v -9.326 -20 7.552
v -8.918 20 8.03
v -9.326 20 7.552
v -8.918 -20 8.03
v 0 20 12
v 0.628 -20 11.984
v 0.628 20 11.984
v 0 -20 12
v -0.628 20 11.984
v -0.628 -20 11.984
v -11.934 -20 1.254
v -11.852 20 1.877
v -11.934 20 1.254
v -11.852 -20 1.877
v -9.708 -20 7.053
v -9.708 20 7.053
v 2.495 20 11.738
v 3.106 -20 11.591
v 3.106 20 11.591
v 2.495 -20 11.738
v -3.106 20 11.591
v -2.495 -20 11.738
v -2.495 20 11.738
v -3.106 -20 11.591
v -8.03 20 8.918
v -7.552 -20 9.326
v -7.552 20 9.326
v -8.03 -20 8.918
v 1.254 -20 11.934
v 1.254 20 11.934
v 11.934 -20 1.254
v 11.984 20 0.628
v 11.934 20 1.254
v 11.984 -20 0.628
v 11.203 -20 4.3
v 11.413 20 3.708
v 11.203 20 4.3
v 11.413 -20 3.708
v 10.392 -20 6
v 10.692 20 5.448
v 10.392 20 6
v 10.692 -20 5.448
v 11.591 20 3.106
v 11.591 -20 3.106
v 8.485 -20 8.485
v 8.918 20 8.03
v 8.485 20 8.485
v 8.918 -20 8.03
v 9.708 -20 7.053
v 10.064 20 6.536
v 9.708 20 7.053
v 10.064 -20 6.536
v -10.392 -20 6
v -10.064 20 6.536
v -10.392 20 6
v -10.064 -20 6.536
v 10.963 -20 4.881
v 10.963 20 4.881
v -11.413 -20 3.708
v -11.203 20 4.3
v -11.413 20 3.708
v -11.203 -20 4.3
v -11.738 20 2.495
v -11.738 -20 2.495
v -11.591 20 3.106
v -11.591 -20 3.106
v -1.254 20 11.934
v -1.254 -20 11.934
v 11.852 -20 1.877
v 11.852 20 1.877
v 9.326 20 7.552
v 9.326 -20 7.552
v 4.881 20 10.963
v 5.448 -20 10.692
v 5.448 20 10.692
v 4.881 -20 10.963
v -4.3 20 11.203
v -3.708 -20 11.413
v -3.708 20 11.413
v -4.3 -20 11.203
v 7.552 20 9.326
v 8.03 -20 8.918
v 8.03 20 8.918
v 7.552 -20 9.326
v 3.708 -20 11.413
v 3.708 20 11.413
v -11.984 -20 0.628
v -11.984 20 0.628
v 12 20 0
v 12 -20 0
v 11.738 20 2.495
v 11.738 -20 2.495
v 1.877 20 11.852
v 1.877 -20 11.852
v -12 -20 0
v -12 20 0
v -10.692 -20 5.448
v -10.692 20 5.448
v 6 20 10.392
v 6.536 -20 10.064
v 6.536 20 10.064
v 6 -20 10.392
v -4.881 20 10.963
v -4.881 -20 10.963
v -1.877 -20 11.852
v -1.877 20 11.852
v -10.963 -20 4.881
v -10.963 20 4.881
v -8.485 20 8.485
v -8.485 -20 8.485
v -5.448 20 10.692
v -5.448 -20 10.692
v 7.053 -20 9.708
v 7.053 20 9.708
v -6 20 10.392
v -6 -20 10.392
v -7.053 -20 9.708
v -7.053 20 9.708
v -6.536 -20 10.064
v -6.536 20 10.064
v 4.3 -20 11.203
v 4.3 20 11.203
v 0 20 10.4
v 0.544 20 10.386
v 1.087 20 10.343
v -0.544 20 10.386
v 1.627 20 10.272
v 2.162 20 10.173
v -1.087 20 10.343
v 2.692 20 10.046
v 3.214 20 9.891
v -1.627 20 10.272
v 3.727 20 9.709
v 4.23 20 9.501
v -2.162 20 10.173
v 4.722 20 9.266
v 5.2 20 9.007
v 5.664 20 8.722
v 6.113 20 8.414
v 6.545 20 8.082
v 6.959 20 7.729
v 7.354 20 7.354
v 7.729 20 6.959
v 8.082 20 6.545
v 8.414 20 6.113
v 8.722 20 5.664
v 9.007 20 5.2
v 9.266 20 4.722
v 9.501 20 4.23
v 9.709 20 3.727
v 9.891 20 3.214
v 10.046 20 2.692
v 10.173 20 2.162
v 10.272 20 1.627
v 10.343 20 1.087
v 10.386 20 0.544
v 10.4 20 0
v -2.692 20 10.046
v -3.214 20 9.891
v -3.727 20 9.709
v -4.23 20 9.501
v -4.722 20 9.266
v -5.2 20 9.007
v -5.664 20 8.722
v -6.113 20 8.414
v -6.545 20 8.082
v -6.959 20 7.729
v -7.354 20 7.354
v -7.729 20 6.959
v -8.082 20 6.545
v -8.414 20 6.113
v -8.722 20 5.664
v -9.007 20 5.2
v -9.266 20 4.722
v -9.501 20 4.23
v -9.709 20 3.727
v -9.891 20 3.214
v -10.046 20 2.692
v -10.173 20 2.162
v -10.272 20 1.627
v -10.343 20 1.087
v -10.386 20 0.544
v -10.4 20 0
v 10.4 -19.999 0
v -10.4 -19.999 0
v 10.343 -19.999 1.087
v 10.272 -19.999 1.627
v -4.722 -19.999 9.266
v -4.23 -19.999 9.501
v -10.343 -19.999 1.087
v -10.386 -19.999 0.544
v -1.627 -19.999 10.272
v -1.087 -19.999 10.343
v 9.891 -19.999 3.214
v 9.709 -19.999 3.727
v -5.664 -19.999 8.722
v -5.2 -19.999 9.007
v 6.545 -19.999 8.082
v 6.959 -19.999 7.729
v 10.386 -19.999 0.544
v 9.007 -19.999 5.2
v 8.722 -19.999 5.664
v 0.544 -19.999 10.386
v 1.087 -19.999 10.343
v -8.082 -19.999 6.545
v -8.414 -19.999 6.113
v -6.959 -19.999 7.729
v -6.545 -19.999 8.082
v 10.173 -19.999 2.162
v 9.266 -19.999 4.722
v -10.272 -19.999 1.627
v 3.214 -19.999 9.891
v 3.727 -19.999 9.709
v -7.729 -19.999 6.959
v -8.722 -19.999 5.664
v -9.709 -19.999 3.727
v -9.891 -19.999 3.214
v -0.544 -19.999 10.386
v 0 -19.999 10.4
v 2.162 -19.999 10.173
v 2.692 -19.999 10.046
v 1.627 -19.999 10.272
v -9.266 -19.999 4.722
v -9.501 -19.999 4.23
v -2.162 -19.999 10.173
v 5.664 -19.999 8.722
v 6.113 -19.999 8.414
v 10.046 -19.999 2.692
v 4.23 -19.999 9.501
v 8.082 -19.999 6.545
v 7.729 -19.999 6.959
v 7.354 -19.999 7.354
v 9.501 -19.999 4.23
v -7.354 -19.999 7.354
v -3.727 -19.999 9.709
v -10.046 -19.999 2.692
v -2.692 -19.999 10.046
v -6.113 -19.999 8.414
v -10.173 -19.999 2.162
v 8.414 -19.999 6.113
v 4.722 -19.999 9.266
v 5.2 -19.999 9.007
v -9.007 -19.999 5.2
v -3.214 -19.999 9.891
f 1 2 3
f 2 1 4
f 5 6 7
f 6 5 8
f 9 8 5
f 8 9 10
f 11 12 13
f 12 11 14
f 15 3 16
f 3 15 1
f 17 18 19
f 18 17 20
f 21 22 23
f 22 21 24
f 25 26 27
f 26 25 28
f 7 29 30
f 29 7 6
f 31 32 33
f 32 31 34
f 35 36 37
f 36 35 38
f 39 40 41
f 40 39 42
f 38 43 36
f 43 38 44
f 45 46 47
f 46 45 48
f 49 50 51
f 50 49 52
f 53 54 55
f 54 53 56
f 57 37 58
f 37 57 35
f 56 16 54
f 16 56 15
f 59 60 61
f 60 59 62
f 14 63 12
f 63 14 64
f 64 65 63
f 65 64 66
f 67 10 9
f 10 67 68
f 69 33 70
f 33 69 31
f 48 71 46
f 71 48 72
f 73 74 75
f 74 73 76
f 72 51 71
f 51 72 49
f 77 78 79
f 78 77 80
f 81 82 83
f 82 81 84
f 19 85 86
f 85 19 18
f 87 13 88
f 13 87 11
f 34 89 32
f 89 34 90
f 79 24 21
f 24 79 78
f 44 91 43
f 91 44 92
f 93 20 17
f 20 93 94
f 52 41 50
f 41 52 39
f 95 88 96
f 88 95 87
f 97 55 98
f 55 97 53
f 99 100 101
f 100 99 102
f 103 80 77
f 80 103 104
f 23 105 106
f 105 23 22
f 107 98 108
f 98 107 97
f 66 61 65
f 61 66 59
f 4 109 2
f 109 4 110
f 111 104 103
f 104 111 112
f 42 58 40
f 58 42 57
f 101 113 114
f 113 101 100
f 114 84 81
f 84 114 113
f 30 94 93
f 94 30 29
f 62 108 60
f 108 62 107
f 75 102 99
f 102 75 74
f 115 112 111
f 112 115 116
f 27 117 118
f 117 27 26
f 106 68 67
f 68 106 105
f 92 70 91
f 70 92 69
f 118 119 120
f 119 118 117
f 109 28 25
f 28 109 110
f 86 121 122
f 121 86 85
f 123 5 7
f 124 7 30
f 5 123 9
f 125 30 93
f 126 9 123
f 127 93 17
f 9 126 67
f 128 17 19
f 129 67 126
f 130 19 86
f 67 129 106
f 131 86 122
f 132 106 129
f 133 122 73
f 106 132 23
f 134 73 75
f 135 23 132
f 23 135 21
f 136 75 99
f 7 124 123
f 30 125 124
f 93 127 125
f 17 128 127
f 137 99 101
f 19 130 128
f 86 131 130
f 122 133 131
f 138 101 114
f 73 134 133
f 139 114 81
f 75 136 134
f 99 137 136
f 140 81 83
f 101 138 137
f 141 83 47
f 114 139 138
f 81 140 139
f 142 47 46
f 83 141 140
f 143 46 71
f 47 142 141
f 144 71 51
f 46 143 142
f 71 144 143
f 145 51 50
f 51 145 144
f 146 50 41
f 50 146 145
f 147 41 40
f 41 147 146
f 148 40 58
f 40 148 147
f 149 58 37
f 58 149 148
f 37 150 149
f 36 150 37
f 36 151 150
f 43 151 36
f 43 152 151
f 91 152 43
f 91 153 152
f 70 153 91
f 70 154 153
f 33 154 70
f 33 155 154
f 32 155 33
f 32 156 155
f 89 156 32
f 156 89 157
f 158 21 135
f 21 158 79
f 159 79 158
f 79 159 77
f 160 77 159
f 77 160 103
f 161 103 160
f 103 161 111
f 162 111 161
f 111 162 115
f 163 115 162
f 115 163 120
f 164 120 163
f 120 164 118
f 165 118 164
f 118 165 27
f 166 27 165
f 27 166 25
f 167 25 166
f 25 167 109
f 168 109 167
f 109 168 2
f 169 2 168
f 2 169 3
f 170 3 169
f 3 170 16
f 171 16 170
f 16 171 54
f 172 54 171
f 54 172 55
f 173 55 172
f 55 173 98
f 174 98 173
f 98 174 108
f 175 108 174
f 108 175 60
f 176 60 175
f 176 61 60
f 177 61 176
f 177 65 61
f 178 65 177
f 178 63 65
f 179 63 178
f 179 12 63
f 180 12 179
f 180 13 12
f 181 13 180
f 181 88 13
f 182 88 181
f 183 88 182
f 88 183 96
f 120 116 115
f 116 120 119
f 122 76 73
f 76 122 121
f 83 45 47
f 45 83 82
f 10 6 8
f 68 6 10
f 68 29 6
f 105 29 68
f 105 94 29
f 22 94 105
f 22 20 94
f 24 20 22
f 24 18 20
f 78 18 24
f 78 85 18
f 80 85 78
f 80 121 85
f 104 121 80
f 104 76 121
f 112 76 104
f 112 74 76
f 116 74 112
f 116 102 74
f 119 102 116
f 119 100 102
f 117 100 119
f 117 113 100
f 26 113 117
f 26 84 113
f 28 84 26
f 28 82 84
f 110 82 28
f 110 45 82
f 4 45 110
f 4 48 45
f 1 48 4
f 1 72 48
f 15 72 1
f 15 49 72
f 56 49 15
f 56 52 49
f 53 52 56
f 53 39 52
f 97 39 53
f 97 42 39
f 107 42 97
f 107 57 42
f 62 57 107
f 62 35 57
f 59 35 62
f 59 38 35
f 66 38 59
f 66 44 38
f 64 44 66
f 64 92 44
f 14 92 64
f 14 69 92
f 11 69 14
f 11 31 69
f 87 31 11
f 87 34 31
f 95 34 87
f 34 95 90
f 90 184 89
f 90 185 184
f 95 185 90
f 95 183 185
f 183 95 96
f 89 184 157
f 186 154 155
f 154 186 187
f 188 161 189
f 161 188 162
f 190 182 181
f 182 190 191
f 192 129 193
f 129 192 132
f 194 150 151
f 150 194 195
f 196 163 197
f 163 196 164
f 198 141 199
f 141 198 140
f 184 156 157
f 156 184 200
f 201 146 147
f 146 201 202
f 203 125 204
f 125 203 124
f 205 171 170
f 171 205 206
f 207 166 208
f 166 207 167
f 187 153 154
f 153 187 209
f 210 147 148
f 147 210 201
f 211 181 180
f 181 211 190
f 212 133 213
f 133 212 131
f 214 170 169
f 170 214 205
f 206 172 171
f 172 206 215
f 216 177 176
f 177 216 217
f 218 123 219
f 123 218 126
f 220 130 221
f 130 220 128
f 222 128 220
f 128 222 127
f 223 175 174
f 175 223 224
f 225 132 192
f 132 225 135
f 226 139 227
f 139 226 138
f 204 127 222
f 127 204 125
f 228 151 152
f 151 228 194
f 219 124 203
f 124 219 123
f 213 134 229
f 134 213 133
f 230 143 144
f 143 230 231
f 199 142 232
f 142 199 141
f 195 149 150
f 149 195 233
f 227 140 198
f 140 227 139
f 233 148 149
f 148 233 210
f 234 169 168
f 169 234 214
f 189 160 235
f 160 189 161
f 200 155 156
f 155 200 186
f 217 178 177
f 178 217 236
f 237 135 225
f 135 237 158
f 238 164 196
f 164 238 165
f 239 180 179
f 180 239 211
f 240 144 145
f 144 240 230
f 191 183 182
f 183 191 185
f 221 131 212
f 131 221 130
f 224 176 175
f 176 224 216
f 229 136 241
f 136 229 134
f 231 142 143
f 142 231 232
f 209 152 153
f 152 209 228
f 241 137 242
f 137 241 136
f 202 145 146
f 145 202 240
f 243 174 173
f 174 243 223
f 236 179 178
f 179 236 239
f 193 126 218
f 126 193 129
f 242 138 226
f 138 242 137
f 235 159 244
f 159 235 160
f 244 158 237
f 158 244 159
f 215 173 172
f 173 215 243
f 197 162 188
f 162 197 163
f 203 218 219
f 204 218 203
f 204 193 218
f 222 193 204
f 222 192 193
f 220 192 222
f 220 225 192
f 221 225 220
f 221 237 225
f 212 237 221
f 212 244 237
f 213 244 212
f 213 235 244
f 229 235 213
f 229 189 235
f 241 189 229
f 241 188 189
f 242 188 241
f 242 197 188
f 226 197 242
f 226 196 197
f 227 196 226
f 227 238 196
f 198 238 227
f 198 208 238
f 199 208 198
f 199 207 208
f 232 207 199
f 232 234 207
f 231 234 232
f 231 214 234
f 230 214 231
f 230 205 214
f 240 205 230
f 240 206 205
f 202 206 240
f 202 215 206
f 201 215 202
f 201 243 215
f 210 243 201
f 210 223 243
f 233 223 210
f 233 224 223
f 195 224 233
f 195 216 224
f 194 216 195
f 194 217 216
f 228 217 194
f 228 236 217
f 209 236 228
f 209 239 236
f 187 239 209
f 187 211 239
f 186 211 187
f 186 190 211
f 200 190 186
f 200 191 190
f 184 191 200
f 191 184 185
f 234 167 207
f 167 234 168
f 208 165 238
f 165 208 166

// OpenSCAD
// Powder-excavator trough, OpenSCAD parametric model.
// All dimensions in mm. Dump-pivot axis is along +Y at z = trough_radius + cam.
trough_radius   = 12;
trough_length   = 40;
wall_thickness  = 1.6;

module trough() {
    difference() {
        // outer half-cylinder (lower hemisphere swept along Y)
        rotate([-90,0,0])
          translate([0,0,-trough_length/2])
            difference() {
              cylinder(h=trough_length, r=trough_radius, $fn=120);
              translate([-trough_radius*1.1, 0, -1])
                cube([trough_radius*2.2, trough_radius*1.1, trough_length+2]);
            }
        // hollow it out
        rotate([-90,0,0])
          translate([0,0,-trough_length/2 + 0.001])
            difference() {
              cylinder(h=trough_length, r=trough_radius - wall_thickness, $fn=120);
              translate([-trough_radius, 0, -1])
                cube([trough_radius*2, trough_radius*1.1, trough_length+2]);
            }
    }
}
trough();
